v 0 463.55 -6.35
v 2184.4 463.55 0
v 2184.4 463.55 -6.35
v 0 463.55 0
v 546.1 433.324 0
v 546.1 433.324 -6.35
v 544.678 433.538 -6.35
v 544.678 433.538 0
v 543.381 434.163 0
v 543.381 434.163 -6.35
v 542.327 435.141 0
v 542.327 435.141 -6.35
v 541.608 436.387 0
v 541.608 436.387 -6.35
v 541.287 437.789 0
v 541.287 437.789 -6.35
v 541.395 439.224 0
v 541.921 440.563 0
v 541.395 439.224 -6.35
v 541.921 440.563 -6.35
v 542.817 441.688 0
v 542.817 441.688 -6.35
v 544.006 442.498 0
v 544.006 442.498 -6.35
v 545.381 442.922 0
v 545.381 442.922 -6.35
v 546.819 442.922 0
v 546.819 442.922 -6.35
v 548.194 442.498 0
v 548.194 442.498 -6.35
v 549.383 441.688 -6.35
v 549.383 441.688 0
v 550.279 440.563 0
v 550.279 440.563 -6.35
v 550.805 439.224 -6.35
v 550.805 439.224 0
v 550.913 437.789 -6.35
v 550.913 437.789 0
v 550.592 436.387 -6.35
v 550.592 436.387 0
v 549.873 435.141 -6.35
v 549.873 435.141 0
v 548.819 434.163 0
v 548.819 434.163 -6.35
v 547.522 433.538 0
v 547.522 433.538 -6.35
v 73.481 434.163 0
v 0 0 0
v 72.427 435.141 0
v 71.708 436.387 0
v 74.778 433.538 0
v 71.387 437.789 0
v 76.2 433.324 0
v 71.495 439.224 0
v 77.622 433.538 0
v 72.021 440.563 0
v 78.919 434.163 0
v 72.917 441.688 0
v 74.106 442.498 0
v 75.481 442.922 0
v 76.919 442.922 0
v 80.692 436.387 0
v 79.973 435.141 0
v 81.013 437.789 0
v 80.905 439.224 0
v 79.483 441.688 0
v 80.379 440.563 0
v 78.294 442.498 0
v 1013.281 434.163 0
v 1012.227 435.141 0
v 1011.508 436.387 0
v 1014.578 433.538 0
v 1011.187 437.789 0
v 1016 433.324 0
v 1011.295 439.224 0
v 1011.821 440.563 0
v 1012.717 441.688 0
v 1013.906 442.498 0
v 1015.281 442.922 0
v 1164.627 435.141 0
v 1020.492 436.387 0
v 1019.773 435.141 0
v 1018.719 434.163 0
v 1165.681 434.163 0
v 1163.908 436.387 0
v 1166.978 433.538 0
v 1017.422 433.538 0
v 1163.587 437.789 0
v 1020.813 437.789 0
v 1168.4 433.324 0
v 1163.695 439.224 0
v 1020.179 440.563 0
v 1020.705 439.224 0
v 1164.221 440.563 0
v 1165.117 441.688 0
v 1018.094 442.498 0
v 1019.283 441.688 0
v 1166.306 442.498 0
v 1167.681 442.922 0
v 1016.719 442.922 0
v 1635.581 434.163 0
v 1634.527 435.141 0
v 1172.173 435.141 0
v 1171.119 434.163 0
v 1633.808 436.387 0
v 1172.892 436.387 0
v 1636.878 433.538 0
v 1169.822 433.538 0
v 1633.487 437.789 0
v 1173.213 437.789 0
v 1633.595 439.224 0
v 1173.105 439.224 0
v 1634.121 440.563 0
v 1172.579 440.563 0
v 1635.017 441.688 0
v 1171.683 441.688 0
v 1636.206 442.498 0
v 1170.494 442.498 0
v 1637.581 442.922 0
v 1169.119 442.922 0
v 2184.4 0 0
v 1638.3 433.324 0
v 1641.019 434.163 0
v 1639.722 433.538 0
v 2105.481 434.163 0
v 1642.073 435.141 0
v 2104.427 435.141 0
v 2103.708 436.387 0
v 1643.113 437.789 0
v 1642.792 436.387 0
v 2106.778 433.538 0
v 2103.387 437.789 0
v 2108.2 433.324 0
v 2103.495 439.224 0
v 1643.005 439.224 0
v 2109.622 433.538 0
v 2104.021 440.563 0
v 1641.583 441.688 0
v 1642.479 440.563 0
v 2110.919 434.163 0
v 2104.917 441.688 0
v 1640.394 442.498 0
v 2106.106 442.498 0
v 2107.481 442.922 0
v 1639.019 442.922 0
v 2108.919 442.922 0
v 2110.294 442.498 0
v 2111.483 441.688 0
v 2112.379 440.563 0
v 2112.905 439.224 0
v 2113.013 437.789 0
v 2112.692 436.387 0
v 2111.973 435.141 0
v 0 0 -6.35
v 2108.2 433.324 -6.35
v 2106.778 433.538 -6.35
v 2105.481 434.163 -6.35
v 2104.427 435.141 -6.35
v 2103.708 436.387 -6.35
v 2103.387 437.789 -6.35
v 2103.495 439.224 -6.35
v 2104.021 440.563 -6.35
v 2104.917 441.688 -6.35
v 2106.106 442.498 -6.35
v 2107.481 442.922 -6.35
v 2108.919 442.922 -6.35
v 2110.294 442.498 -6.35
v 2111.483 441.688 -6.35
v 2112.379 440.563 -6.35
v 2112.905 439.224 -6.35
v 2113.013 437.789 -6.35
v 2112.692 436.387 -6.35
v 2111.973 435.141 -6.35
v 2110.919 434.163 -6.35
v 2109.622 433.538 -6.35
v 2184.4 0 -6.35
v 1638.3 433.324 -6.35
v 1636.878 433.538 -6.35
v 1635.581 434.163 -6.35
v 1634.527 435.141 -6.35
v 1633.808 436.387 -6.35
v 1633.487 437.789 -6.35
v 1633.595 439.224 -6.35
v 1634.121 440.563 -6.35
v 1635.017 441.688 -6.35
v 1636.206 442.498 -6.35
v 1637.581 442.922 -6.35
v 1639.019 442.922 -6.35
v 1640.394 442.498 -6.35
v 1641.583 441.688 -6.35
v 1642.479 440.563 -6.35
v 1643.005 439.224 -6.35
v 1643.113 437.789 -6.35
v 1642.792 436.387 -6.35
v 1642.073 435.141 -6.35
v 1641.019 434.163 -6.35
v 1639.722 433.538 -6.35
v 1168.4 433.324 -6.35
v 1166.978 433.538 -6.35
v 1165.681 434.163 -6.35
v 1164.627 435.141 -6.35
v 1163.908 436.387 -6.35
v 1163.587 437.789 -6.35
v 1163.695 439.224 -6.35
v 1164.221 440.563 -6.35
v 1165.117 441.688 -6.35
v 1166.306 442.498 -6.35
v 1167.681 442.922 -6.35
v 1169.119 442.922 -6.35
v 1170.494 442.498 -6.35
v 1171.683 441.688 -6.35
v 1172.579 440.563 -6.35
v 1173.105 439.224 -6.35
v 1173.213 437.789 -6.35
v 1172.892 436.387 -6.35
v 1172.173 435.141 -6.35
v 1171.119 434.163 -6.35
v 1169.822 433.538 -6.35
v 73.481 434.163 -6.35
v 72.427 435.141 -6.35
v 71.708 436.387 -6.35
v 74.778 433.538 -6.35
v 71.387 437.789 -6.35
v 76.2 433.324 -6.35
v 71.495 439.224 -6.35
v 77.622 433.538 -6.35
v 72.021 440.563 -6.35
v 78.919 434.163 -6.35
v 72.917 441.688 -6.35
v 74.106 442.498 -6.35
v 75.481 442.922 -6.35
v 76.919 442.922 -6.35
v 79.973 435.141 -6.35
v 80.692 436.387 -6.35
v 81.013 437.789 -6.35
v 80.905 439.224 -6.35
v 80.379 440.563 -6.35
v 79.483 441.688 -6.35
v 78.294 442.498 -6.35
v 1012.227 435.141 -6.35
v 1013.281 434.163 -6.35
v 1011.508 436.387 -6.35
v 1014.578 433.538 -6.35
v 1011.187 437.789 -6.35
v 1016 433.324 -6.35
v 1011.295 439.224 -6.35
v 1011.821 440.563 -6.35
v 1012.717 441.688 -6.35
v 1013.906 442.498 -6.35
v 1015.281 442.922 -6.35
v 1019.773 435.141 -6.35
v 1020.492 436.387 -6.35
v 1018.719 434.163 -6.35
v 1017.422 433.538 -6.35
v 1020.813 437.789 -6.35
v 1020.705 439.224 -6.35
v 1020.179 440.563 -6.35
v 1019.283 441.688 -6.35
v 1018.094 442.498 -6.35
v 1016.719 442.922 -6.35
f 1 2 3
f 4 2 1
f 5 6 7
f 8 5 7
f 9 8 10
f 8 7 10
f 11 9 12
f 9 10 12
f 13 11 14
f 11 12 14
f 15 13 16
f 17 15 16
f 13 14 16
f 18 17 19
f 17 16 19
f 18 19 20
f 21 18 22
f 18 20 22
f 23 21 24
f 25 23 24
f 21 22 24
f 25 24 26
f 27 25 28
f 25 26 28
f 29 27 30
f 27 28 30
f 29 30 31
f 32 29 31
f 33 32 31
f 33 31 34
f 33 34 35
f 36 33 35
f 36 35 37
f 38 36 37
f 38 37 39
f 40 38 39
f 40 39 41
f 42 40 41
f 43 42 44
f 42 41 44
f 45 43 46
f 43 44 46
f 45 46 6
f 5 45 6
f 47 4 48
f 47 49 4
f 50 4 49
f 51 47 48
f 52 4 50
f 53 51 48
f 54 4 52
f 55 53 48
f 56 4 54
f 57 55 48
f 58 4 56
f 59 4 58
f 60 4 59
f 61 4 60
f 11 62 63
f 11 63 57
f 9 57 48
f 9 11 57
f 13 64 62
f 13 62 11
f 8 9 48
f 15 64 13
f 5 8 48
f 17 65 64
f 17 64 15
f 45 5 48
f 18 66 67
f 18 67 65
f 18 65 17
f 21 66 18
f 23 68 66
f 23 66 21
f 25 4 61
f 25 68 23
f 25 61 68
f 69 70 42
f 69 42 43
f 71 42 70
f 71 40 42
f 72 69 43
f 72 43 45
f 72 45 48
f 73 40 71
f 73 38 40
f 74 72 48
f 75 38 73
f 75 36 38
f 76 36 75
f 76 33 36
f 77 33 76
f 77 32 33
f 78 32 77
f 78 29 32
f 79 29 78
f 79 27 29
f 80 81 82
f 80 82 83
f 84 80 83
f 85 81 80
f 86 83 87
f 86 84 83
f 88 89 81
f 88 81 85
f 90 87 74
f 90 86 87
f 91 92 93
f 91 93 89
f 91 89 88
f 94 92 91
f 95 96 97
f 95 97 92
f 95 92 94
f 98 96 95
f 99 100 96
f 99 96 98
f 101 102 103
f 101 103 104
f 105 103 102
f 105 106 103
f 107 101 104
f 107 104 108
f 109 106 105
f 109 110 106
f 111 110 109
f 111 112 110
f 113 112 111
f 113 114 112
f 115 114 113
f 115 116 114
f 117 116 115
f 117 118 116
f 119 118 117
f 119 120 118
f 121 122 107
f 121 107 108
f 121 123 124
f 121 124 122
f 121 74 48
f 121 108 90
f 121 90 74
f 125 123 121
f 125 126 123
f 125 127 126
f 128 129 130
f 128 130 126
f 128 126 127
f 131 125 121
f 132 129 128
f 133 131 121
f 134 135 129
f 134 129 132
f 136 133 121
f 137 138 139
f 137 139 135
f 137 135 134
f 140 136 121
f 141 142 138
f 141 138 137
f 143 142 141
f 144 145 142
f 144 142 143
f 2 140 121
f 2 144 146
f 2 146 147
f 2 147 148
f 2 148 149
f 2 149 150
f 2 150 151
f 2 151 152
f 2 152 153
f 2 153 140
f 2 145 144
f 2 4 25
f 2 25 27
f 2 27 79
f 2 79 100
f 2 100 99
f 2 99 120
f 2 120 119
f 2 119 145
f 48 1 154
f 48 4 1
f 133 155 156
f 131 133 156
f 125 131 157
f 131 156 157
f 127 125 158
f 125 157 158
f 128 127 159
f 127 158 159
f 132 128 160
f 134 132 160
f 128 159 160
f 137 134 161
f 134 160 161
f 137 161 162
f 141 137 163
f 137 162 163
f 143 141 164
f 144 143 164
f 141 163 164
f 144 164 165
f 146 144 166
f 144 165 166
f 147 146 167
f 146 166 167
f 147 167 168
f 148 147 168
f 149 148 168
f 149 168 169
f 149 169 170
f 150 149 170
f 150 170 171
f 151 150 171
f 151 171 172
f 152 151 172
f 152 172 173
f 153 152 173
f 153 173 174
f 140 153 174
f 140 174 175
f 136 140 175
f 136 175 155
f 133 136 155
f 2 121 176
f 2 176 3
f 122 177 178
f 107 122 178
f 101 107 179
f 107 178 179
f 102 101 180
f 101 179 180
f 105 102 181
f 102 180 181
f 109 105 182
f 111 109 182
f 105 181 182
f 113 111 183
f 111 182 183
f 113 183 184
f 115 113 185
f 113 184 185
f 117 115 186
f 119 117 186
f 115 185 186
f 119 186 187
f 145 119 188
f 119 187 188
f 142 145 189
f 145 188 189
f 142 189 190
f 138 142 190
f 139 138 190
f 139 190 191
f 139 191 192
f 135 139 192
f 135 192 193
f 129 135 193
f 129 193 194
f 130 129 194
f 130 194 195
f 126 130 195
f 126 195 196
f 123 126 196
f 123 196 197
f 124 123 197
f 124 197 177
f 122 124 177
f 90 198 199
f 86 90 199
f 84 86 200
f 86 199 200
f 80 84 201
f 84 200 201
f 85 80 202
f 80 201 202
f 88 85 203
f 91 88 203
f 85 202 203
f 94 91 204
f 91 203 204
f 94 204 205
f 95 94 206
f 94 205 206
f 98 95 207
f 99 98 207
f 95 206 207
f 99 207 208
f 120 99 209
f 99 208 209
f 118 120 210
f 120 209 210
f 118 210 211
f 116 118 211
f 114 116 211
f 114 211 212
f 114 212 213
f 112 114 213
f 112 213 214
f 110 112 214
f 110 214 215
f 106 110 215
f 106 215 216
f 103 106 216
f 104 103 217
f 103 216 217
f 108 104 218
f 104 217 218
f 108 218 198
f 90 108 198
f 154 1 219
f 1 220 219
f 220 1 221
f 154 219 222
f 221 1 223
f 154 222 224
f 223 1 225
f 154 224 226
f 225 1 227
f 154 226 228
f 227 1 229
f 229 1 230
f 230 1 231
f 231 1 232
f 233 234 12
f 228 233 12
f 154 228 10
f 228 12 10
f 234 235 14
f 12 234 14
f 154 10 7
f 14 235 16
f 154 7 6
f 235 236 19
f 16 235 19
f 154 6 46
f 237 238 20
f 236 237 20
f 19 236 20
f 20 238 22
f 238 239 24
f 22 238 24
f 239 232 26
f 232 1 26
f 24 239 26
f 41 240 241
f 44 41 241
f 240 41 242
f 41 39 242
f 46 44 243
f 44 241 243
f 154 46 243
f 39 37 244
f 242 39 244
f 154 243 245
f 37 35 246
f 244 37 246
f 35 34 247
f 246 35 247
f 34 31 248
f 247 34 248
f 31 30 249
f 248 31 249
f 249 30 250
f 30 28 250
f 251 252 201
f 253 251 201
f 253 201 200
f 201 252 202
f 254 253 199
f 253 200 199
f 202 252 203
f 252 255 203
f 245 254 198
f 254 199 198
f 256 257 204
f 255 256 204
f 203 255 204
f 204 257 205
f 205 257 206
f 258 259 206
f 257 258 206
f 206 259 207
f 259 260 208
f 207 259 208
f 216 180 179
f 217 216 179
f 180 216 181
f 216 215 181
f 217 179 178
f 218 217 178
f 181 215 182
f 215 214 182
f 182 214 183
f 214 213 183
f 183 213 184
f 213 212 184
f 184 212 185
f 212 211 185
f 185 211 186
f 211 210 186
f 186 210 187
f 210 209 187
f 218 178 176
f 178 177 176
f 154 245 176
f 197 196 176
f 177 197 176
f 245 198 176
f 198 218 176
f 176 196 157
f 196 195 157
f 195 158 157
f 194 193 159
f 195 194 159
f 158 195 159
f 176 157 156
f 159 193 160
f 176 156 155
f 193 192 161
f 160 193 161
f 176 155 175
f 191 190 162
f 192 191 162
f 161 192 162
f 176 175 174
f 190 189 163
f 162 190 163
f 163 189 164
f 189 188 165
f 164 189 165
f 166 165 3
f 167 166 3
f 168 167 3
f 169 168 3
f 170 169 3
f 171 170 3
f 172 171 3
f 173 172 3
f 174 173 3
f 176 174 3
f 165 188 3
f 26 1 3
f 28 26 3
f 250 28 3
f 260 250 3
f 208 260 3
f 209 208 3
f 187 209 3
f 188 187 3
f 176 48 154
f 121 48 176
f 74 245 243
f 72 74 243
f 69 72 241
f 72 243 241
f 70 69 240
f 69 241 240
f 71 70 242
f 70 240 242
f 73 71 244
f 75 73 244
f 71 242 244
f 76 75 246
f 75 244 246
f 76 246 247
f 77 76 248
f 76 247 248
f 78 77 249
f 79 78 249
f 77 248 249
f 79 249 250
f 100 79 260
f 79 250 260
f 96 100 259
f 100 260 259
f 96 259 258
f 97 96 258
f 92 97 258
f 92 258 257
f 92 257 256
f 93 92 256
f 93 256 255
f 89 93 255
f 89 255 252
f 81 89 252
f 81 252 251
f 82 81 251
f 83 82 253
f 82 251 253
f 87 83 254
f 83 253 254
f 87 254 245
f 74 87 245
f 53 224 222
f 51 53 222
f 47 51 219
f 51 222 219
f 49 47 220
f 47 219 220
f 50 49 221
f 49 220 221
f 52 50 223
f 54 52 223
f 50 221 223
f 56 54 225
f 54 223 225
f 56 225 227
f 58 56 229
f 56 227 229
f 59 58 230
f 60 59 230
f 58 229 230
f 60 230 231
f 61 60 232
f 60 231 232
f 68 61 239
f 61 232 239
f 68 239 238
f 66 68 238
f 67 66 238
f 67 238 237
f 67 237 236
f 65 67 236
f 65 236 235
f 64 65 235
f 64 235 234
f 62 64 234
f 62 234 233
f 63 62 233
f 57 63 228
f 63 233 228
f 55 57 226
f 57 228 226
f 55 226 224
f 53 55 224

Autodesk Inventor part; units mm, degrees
ref_plane "YZ Plane" through (0, 0, 0) normal (1, 0, 0) x (0, 1, 0)
ref_plane "XZ Plane" through (0, 0, 0) normal (0, 1, 0) x (-1, 0, 0)
ref_plane "XY Plane" through (0, 0, 0) normal (0, 0, 1) x (1, 0, 0)
sketch "Sketch1" plane through (0, 0, 0) normal (0, 0, 1) x (1, 0, 0)
  line L0 (0, 0) -> (2184.4, 0)
  line L1 (2184.4, 0) -> (2184.4, 463.55)
  line L2 (2184.4, 463.55) -> (0, 463.55)
  line L3 (0, 463.55) -> (0, 0)
  dimension "d0" = 2184.4
  dimension "d1" = 463.55
extrude "Extrusion1" add sketch "Sketch1" against normal blind 6.35
sketch "Sketch2" plane through (0, 0, 0) normal (0, 0, 1) x (1, 0, 0)
  line L0 (2184.4, 463.55) -> (0, 463.55) projected
  line L1 (0, 463.55) -> (0, 0) projected
  point P0 (76.2, 438.15)
  point P1 (546.1, 438.15)
  point P2 (1016, 438.15)
  point P3 (1168.4, 438.15)
  point P4 (1638.3, 438.15)
  point P5 (2108.2, 438.15)
  dimension "d4" = 76.2
  dimension "d5" = 25.4
  dimension "d6" = 546.1
  dimension "d7" = 1016
  dimension "d8" = 1168.4
  dimension "d9" = 1638.3
  dimension "d10" = 2108.2
hole "Hole1" at (76.2, 438.15, 0) at (546.1, 438.15, 0) at (1016, 438.15, 0) at (1168.4, 438.15, 0) at (1638.3, 438.15, 0) at (2108.2, 438.15, 0) direction (0, 0, -1) diameter 9.652 end through all
properties part number "GE-13035" material "Polycarbonate, Clear"
